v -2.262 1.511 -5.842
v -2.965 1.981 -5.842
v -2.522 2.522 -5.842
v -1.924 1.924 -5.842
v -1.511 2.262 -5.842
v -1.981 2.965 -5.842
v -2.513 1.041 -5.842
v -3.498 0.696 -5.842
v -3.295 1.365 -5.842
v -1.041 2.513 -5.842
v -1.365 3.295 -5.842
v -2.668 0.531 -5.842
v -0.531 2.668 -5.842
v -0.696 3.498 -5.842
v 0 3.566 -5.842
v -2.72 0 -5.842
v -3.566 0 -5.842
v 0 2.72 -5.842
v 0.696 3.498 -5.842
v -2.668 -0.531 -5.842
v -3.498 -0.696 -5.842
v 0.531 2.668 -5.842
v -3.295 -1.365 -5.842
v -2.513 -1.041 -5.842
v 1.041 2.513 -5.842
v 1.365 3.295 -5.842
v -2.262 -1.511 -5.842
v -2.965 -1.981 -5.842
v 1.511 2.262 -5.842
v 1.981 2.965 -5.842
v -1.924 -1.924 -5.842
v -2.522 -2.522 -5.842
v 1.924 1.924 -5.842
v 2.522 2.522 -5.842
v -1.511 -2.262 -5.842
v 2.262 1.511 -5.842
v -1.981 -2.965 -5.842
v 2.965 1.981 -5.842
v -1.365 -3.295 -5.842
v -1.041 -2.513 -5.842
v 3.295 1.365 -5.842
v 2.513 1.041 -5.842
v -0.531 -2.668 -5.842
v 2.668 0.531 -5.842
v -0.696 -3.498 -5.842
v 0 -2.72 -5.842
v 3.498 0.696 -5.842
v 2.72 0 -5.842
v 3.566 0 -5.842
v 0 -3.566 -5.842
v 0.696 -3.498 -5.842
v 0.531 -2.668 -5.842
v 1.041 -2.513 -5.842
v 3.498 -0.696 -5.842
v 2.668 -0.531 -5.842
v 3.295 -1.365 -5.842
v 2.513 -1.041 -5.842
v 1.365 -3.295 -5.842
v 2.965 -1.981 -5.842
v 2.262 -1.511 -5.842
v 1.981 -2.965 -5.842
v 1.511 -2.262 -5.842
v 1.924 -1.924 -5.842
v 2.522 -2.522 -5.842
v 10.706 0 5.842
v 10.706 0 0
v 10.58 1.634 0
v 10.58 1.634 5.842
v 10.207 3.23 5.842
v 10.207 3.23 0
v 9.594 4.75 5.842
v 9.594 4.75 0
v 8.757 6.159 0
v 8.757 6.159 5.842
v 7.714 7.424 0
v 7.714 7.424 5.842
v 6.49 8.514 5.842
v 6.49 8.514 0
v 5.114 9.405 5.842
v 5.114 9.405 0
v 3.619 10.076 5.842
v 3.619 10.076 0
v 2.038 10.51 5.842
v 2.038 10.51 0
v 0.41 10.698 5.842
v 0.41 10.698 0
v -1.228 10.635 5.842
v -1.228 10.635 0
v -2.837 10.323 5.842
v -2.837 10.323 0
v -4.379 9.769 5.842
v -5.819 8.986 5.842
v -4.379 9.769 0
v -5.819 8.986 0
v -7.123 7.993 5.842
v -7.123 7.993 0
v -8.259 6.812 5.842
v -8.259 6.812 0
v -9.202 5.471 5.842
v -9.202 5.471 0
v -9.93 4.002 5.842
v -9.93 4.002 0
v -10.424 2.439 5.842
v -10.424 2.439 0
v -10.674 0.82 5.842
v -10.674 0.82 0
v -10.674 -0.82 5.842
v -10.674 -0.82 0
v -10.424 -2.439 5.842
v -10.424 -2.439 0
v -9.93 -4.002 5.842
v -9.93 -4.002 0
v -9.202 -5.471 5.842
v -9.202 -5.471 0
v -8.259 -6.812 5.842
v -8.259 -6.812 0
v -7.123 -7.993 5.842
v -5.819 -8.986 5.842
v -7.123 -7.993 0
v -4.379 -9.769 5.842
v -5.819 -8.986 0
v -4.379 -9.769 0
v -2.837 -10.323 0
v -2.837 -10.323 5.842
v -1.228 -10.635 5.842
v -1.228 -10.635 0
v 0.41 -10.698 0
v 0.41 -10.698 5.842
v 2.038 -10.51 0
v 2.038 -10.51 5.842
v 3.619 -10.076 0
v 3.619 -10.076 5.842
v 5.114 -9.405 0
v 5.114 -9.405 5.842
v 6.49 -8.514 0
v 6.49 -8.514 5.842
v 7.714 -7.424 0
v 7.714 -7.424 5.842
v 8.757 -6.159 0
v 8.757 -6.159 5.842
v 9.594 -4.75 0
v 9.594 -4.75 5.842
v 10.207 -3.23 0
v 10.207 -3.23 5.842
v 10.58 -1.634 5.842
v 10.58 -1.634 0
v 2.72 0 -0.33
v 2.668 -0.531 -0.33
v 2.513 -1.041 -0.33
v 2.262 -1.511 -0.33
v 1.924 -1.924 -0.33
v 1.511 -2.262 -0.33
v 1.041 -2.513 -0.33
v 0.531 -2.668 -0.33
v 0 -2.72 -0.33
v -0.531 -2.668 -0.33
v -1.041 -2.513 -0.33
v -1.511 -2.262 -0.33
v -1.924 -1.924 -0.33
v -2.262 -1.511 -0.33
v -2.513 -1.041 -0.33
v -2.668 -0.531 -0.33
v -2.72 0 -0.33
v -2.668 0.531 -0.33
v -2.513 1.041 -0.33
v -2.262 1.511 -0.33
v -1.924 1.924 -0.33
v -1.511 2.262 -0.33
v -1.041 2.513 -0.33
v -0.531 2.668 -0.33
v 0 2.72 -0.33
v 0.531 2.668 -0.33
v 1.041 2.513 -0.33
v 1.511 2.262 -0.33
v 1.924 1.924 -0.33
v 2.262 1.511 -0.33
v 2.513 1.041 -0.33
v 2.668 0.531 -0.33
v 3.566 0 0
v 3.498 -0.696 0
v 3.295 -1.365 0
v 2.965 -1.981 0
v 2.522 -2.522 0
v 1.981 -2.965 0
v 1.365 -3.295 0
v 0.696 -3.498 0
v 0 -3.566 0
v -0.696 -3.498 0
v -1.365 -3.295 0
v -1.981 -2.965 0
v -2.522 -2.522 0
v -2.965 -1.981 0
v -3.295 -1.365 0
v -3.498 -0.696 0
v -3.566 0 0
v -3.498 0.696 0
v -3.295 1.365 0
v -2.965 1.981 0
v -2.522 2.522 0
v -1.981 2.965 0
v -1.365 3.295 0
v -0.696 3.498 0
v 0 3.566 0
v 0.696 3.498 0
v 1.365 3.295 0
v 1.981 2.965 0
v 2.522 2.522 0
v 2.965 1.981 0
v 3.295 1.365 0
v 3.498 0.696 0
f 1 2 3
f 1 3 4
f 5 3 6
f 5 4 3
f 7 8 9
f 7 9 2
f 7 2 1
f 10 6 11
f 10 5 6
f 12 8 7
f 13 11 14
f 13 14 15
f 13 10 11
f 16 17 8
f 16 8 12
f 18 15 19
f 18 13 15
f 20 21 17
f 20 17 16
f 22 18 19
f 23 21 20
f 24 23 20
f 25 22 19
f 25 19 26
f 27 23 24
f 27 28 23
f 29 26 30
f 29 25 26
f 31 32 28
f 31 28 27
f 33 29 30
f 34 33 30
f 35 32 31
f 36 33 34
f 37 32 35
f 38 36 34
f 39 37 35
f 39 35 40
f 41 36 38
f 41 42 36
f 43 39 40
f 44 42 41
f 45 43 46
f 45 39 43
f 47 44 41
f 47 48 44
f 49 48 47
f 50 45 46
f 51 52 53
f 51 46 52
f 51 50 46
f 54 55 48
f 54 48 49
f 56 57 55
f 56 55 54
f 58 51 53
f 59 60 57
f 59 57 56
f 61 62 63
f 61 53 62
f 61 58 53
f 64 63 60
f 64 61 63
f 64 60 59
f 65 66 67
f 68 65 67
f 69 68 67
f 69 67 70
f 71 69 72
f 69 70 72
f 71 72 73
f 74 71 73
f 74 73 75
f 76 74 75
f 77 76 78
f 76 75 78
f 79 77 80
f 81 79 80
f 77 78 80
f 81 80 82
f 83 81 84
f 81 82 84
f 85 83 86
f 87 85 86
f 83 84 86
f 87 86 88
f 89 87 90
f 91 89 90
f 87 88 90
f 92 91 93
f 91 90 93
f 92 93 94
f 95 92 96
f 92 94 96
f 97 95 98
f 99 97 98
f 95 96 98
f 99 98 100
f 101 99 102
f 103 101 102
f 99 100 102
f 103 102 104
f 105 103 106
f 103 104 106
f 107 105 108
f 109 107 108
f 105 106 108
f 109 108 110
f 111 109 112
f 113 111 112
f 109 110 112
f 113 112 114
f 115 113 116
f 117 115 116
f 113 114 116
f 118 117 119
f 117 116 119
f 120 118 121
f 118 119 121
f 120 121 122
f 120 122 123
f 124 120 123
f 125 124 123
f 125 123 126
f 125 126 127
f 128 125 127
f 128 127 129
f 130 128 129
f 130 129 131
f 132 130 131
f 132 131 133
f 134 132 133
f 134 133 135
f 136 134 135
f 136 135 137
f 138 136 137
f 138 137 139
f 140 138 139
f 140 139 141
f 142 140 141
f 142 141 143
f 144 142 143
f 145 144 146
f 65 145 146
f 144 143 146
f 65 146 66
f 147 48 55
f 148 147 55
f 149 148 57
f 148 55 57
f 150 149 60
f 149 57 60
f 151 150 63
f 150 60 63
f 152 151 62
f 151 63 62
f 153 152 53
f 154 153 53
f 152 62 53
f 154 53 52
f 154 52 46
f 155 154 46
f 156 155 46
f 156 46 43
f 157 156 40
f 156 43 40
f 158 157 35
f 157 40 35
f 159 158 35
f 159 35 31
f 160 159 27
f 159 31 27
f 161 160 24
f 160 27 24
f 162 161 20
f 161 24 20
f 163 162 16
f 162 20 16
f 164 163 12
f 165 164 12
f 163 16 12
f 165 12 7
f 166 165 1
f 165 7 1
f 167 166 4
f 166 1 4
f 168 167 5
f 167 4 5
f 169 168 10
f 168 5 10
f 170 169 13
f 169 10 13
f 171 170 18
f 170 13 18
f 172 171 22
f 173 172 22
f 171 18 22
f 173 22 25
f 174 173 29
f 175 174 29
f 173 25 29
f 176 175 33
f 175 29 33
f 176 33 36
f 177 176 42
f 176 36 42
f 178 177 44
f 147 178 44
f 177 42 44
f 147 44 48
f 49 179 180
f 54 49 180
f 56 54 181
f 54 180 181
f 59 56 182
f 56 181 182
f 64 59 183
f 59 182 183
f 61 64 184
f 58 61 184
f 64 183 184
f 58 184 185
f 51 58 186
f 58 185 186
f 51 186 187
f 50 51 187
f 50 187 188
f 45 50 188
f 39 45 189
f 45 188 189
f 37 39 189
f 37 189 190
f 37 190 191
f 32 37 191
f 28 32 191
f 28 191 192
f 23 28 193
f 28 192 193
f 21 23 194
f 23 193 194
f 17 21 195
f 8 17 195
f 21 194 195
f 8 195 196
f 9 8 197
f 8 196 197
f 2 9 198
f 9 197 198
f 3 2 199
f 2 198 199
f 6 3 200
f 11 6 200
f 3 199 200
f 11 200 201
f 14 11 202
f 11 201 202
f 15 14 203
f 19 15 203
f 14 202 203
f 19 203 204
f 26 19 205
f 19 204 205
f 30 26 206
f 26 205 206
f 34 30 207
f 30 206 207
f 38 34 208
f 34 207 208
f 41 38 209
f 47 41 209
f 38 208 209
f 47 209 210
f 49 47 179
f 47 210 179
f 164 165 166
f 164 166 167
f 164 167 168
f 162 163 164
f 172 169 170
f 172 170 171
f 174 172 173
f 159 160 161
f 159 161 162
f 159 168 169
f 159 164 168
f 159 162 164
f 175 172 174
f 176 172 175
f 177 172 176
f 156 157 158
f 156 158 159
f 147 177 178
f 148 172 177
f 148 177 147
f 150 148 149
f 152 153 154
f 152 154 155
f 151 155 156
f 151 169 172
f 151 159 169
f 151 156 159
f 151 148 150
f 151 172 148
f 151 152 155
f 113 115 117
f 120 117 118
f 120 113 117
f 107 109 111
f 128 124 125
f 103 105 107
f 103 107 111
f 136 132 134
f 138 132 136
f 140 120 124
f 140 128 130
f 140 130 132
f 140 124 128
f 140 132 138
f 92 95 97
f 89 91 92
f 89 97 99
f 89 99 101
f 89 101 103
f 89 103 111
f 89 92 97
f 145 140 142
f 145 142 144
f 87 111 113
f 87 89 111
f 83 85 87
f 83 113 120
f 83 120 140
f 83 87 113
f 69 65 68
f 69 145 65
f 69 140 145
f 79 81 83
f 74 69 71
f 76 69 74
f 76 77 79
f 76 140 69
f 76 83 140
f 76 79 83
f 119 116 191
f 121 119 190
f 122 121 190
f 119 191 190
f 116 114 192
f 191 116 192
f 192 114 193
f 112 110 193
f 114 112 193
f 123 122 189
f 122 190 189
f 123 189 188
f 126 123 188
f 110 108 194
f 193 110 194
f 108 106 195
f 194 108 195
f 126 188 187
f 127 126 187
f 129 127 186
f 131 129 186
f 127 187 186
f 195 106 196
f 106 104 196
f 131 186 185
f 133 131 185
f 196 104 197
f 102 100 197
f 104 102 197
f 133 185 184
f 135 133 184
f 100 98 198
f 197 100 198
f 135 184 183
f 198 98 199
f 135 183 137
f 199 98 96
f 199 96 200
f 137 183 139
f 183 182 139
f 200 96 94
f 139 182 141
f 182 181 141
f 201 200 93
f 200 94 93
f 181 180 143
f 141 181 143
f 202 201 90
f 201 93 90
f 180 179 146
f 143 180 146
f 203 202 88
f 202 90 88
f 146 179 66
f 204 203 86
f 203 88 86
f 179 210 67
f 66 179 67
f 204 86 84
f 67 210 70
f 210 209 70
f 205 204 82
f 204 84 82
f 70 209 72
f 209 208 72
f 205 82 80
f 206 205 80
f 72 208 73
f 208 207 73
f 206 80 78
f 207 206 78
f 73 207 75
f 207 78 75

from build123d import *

# Parameters (mm, degrees)
F0_R     = 10.705893
F1_DEPTH = 5.842
F2_R     = 3.566194
F3_DEPTH = 5.842
F4_R     = 2.719536
F5_DEPTH = 5.5118
F6_R     = 2.717977
F7_DEPTH = 5.5118
F8_R     = 2.720478
F9_DEPTH = 5.5118


with BuildPart() as f1:
    # F0 (on Top) → F1 (new body)
    with BuildSketch(Plane.XY):
        Circle(F0_R)
    extrude(amount=F1_DEPTH)

    # F2 (on face) → F3 (join)
    with BuildSketch(Plane(origin=(0, 0, 0), x_dir=(1, 0, 0), z_dir=(0, 0, -1))):
        Circle(F2_R)
    extrude(amount=F3_DEPTH)

    # F4 (on face) → F5 (join)
    with BuildSketch(Plane(origin=(0, 0, -5.842), x_dir=(1, 0, 0), z_dir=(0, 0, -1))):
        Circle(F4_R)
    extrude(amount=-F5_DEPTH)

    # F6 (on face) → F7 (join)
    with BuildSketch(Plane(origin=(0, 0, -5.842), x_dir=(1, 0, 0), z_dir=(0, 0, -1))):
        Circle(F6_R)
    extrude(amount=-F7_DEPTH)

    # F8 (on face) → F9 (cut)
    with BuildSketch(Plane(origin=(0, 0, -5.842), x_dir=(1, 0, 0), z_dir=(0, 0, -1))):
        Circle(F8_R)
    extrude(amount=-F9_DEPTH, mode=Mode.SUBTRACT)


solid = f1.part
